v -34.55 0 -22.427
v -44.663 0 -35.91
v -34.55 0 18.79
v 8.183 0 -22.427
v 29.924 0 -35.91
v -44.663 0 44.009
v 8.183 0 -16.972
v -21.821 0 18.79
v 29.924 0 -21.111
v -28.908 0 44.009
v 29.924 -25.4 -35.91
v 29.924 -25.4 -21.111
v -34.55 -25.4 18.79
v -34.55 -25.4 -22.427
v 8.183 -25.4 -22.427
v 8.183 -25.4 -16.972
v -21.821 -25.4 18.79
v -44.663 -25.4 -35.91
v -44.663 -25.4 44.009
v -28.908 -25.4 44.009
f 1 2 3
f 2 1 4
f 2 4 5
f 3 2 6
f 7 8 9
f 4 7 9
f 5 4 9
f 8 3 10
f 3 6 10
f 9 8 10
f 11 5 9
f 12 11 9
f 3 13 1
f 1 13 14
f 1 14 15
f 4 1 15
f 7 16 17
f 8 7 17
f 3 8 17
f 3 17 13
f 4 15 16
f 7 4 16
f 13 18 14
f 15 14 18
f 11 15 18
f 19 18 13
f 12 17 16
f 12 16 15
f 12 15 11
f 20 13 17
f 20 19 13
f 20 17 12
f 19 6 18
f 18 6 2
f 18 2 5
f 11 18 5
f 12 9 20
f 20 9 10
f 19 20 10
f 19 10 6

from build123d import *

# Parameters (mm, degrees)
F1_DEPTH = 25.4
F3_DEPTH = 25.401


with BuildPart() as f1:
    # F0 (on Front) → F1 (new body)
    with BuildSketch(Plane.XZ):
        Polygon((-28.907506, 44.009075), (-44.663455, 44.009075), (-44.663455, -35.910148), (29.924411, -35.910148), (29.924411, -21.110609), align=None)
    extrude(amount=F1_DEPTH)

    # F2 (on face) → F3 (cut, through all)
    with BuildSketch(Plane.XZ.offset(25.4)):
        Polygon((-21.82091, 18.790228), (-34.549773, 18.790228), (-34.549773, -22.427047), (8.182841, -22.427047), (8.182841, -16.971819), align=None)
    extrude(amount=-F3_DEPTH, mode=Mode.SUBTRACT)


solid = f1.part
